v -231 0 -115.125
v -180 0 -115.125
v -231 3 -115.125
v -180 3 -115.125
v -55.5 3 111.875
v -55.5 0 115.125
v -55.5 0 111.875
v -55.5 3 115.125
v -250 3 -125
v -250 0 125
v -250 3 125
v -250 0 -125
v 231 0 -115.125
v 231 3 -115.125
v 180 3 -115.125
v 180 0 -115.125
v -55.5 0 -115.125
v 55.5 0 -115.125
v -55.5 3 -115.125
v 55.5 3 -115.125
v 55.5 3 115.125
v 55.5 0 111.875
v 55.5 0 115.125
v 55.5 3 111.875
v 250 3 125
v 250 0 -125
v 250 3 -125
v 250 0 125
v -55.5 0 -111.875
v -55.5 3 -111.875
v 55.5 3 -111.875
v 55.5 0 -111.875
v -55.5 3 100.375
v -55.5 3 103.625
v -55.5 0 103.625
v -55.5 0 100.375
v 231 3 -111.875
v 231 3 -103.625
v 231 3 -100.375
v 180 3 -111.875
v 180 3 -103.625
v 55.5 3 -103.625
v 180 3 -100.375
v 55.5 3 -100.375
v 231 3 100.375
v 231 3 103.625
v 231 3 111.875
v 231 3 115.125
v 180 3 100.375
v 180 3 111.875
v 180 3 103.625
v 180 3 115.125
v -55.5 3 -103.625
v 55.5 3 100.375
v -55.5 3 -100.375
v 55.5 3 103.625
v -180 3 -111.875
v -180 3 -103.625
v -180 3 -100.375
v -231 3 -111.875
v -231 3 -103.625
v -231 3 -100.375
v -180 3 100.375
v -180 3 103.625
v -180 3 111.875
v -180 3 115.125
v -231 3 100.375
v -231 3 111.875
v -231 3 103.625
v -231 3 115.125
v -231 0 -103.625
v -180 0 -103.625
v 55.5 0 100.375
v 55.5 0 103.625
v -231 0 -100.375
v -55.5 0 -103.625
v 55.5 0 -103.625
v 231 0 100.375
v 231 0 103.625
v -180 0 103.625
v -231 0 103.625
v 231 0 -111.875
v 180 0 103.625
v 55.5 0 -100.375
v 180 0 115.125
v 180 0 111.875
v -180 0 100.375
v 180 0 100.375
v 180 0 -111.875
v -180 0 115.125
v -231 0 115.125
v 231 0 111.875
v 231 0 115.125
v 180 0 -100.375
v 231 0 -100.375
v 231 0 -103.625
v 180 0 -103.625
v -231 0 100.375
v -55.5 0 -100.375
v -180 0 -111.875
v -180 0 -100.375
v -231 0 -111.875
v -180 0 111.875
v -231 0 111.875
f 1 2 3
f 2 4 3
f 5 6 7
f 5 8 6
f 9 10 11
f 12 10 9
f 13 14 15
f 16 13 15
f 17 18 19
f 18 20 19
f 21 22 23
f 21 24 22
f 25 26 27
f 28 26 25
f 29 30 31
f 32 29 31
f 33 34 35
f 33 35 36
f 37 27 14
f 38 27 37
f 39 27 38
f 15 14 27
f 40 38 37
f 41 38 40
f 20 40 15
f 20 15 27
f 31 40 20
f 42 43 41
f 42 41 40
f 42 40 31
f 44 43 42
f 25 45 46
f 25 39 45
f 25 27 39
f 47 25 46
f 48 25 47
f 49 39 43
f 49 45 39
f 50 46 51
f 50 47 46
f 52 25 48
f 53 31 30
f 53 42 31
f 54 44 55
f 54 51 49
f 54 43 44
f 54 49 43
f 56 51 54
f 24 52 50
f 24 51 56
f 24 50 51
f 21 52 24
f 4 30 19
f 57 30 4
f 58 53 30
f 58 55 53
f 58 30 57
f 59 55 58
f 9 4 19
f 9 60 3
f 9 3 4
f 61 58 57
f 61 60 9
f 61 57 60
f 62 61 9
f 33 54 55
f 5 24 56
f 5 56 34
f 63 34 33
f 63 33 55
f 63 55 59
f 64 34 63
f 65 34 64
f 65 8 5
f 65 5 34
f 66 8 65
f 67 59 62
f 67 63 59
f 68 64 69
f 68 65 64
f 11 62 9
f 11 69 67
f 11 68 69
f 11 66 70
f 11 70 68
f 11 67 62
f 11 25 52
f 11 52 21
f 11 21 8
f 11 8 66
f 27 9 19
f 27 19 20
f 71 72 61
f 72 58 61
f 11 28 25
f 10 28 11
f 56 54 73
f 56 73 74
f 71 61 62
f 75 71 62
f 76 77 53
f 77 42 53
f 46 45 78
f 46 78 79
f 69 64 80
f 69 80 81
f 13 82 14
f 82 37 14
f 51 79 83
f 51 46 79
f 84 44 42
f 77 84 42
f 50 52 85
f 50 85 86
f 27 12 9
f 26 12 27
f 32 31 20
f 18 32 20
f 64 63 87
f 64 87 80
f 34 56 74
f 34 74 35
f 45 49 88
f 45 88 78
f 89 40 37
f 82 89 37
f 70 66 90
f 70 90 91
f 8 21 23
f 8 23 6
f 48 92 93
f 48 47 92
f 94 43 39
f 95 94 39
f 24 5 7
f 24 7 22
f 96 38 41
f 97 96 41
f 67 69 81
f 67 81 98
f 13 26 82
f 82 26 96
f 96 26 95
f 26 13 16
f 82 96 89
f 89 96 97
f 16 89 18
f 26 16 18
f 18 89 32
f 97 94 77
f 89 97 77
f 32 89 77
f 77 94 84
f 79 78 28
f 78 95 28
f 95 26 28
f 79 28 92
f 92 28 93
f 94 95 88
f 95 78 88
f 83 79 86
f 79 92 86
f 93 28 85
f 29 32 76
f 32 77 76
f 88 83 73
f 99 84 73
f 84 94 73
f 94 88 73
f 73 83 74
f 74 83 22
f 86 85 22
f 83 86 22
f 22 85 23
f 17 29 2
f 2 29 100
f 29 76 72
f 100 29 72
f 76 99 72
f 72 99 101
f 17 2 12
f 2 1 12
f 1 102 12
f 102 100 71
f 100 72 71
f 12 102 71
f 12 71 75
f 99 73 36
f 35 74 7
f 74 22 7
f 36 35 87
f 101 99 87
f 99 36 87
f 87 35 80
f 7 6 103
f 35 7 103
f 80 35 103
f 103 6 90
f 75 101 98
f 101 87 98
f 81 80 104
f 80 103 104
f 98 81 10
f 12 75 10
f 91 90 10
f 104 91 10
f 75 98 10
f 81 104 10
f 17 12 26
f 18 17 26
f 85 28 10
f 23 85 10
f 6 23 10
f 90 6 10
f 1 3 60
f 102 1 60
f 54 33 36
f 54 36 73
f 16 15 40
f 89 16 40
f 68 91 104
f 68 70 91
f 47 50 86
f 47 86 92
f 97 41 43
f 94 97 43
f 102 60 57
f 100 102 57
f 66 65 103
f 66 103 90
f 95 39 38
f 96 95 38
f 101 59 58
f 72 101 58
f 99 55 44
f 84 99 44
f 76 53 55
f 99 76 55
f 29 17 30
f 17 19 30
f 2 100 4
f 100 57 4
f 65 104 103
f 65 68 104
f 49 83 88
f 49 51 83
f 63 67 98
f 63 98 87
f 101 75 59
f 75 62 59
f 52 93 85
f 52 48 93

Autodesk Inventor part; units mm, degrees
ref_plane "YZ Plane" through (0, 0, 0) normal (1, 0, 0) x (0, 1, 0)
ref_plane "XZ Plane" through (0, 0, 0) normal (0, 1, 0) x (-1, 0, 0)
ref_plane "XY Plane" through (0, 0, 0) normal (0, 0, 1) x (1, 0, 0)
sketch "Sketch1" plane through (0, 0, 0) normal (0, 1, 0) x (-1, 0, 0)
  line L0 (-250, 125) -> (250, 125)
  line L1 (250, 125) -> (250, -125)
  line L2 (250, -125) -> (-250, -125)
  line L3 (-250, -125) -> (-250, 125)
  line L4 (-250, 125) -> (250, -125) construction
  line L5 (250, 125) -> (-250, -125) construction
  point P0 (0, 0)
  dimension "d0" = 500
  dimension "d1" = 250
extrude "Extrusion1" add sketch "Sketch1" along normal blind 3
sketch "Sketch3" plane through (0, 3, 0) normal (0, 1, 0) x (1, 0, 0)
  line L0 (55.5, 115.125) -> (4.5, 115.125)
  line L1 (4.5, 115.125) -> (4.5, 111.875)
  line L2 (4.5, 111.875) -> (55.5, 111.875)
  line L3 (55.5, 111.875) -> (55.5, 115.125)
  line L4 (55.5, 115.125) -> (4.5, 111.875) construction
  line L5 (4.5, 115.125) -> (55.5, 111.875) construction
  line L6 (-4.5, 115.125) -> (-55.5, 115.125)
  line L7 (-55.5, 115.125) -> (-55.5, 111.875)
  line L8 (-55.5, 111.875) -> (-4.5, 111.875)
  line L9 (-4.5, 111.875) -> (-4.5, 115.125)
  line L10 (-4.5, 115.125) -> (-55.5, 111.875) construction
  line L11 (-55.5, 115.125) -> (-4.5, 111.875) construction
  line L12 (250, 125) -> (-250, 125) projected
  line L13 (231, 115.125) -> (180, 115.125)
  line L14 (180, 115.125) -> (180, 111.875)
  line L15 (180, 111.875) -> (231, 111.875)
  line L16 (231, 111.875) -> (231, 115.125)
  line L17 (231, 115.125) -> (180, 111.875) construction
  line L18 (180, 115.125) -> (231, 111.875) construction
  line L19 (4.5, 115.125) -> (-4.5, 115.125)
  line L20 (-4.5, 115.125) -> (-4.5, 111.875)
  line L21 (-4.5, 111.875) -> (4.5, 111.875)
  line L22 (4.5, 111.875) -> (4.5, 115.125)
  line L23 (-180, 115.125) -> (-231, 115.125)
  line L24 (-231, 115.125) -> (-231, 111.875)
  line L25 (-231, 111.875) -> (-180, 111.875)
  line L26 (-180, 111.875) -> (-180, 115.125)
  line L27 (250, 125) -> (250, -125)
  line L28 (55.5, 103.625) -> (4.5, 103.625)
  line L29 (4.5, 103.625) -> (4.5, 100.375)
  line L30 (4.5, 100.375) -> (55.5, 100.375)
  line L31 (55.5, 100.375) -> (55.5, 103.625)
  line L32 (55.5, 103.625) -> (4.5, 100.375) construction
  line L33 (4.5, 103.625) -> (55.5, 100.375) construction
  line L34 (-4.5, 103.625) -> (-55.5, 103.625)
  line L35 (-55.5, 103.625) -> (-55.5, 100.375)
  line L36 (-55.5, 100.375) -> (-4.5, 100.375)
  line L37 (-4.5, 100.375) -> (-4.5, 103.625)
  line L38 (-4.5, 103.625) -> (-55.5, 100.375) construction
  line L39 (-55.5, 103.625) -> (-4.5, 100.375) construction
  line L40 (4.5, 103.625) -> (-4.5, 103.625)
  line L41 (-4.5, 103.625) -> (-4.5, 100.375)
  line L42 (-4.5, 100.375) -> (4.5, 100.375)
  line L43 (4.5, 100.375) -> (4.5, 103.625)
  line L44 (-180, 103.625) -> (-231, 103.625)
  line L45 (-231, 103.625) -> (-231, 100.375)
  line L46 (-231, 100.375) -> (-180, 100.375)
  line L47 (-180, 100.375) -> (-180, 103.625)
  line L48 (250, 113.5) -> (250, -136.5)
  line L49 (253.2147, 0) -> (-252.6779, 0)
  line L50 (231, 103.625) -> (180, 103.625)
  line L51 (180, 103.625) -> (180, 100.375)
  line L52 (180, 100.375) -> (231, 100.375)
  line L53 (231, 100.375) -> (231, 103.625)
  line L54 (231, 103.625) -> (180, 100.375) construction
  line L55 (180, 103.625) -> (231, 100.375) construction
  line L56 (55.5, -115.125) -> (4.5, -115.125)
  line L57 (4.5, -115.125) -> (4.5, -111.875)
  line L58 (4.5, -111.875) -> (55.5, -111.875)
  line L59 (55.5, -111.875) -> (55.5, -115.125)
  line L60 (55.5, -115.125) -> (4.5, -111.875) construction
  line L61 (4.5, -115.125) -> (55.5, -111.875) construction
  line L62 (-4.5, -115.125) -> (-55.5, -115.125)
  line L63 (-55.5, -115.125) -> (-55.5, -111.875)
  line L64 (-55.5, -111.875) -> (-4.5, -111.875)
  line L65 (-4.5, -111.875) -> (-4.5, -115.125)
  line L66 (-4.5, -115.125) -> (-55.5, -111.875) construction
  line L67 (-55.5, -115.125) -> (-4.5, -111.875) construction
  line L68 (250, -125) -> (-250, -125)
  line L69 (231, -115.125) -> (180, -115.125)
  line L70 (180, -115.125) -> (180, -111.875)
  line L71 (180, -111.875) -> (231, -111.875)
  line L72 (231, -111.875) -> (231, -115.125)
  line L73 (231, -115.125) -> (180, -111.875) construction
  line L74 (180, -115.125) -> (231, -111.875) construction
  line L75 (4.5, -115.125) -> (-4.5, -115.125)
  line L76 (-4.5, -115.125) -> (-4.5, -111.875)
  line L77 (-4.5, -111.875) -> (4.5, -111.875)
  line L78 (4.5, -111.875) -> (4.5, -115.125)
  line L79 (-180, -115.125) -> (-231, -115.125)
  line L80 (-231, -115.125) -> (-231, -111.875)
  line L81 (-231, -111.875) -> (-180, -111.875)
  line L82 (-180, -111.875) -> (-180, -115.125)
  line L83 (4.5, -103.625) -> (-4.5, -103.625)
  line L84 (-4.5, -100.375) -> (4.5, -100.375)
  line L85 (-4.5, -100.375) -> (-4.5, -103.625)
  line L86 (-4.5, -103.625) -> (-4.5, -100.375)
  line L87 (-55.5, -100.375) -> (-4.5, -100.375)
  line L88 (-55.5, -103.625) -> (-55.5, -100.375)
  line L89 (-4.5, -103.625) -> (-55.5, -100.375) construction
  line L90 (-55.5, -103.625) -> (-4.5, -100.375) construction
  line L91 (-4.5, -103.625) -> (-55.5, -103.625)
  line L92 (4.5, -103.625) -> (4.5, -100.375)
  line L93 (4.5, -100.375) -> (4.5, -103.625)
  line L94 (55.5, -103.625) -> (4.5, -103.625)
  line L95 (4.5, -100.375) -> (55.5, -100.375)
  line L96 (55.5, -103.625) -> (4.5, -100.375) construction
  line L97 (4.5, -103.625) -> (55.5, -100.375) construction
  line L98 (55.5, -100.375) -> (55.5, -103.625)
  line L99 (-180, -100.375) -> (-180, -103.625)
  line L100 (-180, -103.625) -> (-231, -103.625)
  line L101 (-231, -100.375) -> (-180, -100.375)
  line L102 (-231, -103.625) -> (-231, -100.375)
  line L103 (180, -103.625) -> (180, -100.375)
  line L104 (231, -103.625) -> (180, -103.625)
  line L105 (180, -100.375) -> (231, -100.375)
  line L106 (231, -103.625) -> (180, -100.375) construction
  line L107 (180, -103.625) -> (231, -100.375) construction
  line L108 (231, -100.375) -> (231, -103.625)
  point P0 (0, 0)
  point P1 (30, 113.5)
  point P2 (-30, 113.5)
  point P3 (205.5, 113.5)
  point P4 (0, -11.5)
  point P5 (30, 102)
  point P6 (-30, 102)
  point P7 (-250, 113.5)
  point P8 (205.5, 102)
  point P9 (30, -113.5)
  point P10 (-30, -113.5)
  point P11 (205.5, -113.5)
  point P12 (250, -113.5)
  point P13 (-250, -113.5)
  point P14 (-30, -102)
  point P15 (30, -102)
  point P16 (205.5, -102)
  dimension "d28" = 51
  dimension "d29" = 3.25
  dimension "d30" = 51
  dimension "d31" = 3.25
  dimension "d32" = 4.5
  dimension "d33" = 9
  dimension "d34" = 9.875
  dimension "d35" = 9.875
  dimension "d36" = 51
  dimension "d37" = 3.25
  dimension "d38" = 124.5
  dimension "d39" = 9.875
  dimension "d40" = 51
  dimension "d41" = 3.25
  dimension "d42" = 124.5
  dimension "d43" = 9.875
  dimension "d46" = 11.5
  dimension "d53" = 11.5
extrude "Extrusion3" cut sketch "Sketch3" against normal blind 10
properties part number "plaat"
